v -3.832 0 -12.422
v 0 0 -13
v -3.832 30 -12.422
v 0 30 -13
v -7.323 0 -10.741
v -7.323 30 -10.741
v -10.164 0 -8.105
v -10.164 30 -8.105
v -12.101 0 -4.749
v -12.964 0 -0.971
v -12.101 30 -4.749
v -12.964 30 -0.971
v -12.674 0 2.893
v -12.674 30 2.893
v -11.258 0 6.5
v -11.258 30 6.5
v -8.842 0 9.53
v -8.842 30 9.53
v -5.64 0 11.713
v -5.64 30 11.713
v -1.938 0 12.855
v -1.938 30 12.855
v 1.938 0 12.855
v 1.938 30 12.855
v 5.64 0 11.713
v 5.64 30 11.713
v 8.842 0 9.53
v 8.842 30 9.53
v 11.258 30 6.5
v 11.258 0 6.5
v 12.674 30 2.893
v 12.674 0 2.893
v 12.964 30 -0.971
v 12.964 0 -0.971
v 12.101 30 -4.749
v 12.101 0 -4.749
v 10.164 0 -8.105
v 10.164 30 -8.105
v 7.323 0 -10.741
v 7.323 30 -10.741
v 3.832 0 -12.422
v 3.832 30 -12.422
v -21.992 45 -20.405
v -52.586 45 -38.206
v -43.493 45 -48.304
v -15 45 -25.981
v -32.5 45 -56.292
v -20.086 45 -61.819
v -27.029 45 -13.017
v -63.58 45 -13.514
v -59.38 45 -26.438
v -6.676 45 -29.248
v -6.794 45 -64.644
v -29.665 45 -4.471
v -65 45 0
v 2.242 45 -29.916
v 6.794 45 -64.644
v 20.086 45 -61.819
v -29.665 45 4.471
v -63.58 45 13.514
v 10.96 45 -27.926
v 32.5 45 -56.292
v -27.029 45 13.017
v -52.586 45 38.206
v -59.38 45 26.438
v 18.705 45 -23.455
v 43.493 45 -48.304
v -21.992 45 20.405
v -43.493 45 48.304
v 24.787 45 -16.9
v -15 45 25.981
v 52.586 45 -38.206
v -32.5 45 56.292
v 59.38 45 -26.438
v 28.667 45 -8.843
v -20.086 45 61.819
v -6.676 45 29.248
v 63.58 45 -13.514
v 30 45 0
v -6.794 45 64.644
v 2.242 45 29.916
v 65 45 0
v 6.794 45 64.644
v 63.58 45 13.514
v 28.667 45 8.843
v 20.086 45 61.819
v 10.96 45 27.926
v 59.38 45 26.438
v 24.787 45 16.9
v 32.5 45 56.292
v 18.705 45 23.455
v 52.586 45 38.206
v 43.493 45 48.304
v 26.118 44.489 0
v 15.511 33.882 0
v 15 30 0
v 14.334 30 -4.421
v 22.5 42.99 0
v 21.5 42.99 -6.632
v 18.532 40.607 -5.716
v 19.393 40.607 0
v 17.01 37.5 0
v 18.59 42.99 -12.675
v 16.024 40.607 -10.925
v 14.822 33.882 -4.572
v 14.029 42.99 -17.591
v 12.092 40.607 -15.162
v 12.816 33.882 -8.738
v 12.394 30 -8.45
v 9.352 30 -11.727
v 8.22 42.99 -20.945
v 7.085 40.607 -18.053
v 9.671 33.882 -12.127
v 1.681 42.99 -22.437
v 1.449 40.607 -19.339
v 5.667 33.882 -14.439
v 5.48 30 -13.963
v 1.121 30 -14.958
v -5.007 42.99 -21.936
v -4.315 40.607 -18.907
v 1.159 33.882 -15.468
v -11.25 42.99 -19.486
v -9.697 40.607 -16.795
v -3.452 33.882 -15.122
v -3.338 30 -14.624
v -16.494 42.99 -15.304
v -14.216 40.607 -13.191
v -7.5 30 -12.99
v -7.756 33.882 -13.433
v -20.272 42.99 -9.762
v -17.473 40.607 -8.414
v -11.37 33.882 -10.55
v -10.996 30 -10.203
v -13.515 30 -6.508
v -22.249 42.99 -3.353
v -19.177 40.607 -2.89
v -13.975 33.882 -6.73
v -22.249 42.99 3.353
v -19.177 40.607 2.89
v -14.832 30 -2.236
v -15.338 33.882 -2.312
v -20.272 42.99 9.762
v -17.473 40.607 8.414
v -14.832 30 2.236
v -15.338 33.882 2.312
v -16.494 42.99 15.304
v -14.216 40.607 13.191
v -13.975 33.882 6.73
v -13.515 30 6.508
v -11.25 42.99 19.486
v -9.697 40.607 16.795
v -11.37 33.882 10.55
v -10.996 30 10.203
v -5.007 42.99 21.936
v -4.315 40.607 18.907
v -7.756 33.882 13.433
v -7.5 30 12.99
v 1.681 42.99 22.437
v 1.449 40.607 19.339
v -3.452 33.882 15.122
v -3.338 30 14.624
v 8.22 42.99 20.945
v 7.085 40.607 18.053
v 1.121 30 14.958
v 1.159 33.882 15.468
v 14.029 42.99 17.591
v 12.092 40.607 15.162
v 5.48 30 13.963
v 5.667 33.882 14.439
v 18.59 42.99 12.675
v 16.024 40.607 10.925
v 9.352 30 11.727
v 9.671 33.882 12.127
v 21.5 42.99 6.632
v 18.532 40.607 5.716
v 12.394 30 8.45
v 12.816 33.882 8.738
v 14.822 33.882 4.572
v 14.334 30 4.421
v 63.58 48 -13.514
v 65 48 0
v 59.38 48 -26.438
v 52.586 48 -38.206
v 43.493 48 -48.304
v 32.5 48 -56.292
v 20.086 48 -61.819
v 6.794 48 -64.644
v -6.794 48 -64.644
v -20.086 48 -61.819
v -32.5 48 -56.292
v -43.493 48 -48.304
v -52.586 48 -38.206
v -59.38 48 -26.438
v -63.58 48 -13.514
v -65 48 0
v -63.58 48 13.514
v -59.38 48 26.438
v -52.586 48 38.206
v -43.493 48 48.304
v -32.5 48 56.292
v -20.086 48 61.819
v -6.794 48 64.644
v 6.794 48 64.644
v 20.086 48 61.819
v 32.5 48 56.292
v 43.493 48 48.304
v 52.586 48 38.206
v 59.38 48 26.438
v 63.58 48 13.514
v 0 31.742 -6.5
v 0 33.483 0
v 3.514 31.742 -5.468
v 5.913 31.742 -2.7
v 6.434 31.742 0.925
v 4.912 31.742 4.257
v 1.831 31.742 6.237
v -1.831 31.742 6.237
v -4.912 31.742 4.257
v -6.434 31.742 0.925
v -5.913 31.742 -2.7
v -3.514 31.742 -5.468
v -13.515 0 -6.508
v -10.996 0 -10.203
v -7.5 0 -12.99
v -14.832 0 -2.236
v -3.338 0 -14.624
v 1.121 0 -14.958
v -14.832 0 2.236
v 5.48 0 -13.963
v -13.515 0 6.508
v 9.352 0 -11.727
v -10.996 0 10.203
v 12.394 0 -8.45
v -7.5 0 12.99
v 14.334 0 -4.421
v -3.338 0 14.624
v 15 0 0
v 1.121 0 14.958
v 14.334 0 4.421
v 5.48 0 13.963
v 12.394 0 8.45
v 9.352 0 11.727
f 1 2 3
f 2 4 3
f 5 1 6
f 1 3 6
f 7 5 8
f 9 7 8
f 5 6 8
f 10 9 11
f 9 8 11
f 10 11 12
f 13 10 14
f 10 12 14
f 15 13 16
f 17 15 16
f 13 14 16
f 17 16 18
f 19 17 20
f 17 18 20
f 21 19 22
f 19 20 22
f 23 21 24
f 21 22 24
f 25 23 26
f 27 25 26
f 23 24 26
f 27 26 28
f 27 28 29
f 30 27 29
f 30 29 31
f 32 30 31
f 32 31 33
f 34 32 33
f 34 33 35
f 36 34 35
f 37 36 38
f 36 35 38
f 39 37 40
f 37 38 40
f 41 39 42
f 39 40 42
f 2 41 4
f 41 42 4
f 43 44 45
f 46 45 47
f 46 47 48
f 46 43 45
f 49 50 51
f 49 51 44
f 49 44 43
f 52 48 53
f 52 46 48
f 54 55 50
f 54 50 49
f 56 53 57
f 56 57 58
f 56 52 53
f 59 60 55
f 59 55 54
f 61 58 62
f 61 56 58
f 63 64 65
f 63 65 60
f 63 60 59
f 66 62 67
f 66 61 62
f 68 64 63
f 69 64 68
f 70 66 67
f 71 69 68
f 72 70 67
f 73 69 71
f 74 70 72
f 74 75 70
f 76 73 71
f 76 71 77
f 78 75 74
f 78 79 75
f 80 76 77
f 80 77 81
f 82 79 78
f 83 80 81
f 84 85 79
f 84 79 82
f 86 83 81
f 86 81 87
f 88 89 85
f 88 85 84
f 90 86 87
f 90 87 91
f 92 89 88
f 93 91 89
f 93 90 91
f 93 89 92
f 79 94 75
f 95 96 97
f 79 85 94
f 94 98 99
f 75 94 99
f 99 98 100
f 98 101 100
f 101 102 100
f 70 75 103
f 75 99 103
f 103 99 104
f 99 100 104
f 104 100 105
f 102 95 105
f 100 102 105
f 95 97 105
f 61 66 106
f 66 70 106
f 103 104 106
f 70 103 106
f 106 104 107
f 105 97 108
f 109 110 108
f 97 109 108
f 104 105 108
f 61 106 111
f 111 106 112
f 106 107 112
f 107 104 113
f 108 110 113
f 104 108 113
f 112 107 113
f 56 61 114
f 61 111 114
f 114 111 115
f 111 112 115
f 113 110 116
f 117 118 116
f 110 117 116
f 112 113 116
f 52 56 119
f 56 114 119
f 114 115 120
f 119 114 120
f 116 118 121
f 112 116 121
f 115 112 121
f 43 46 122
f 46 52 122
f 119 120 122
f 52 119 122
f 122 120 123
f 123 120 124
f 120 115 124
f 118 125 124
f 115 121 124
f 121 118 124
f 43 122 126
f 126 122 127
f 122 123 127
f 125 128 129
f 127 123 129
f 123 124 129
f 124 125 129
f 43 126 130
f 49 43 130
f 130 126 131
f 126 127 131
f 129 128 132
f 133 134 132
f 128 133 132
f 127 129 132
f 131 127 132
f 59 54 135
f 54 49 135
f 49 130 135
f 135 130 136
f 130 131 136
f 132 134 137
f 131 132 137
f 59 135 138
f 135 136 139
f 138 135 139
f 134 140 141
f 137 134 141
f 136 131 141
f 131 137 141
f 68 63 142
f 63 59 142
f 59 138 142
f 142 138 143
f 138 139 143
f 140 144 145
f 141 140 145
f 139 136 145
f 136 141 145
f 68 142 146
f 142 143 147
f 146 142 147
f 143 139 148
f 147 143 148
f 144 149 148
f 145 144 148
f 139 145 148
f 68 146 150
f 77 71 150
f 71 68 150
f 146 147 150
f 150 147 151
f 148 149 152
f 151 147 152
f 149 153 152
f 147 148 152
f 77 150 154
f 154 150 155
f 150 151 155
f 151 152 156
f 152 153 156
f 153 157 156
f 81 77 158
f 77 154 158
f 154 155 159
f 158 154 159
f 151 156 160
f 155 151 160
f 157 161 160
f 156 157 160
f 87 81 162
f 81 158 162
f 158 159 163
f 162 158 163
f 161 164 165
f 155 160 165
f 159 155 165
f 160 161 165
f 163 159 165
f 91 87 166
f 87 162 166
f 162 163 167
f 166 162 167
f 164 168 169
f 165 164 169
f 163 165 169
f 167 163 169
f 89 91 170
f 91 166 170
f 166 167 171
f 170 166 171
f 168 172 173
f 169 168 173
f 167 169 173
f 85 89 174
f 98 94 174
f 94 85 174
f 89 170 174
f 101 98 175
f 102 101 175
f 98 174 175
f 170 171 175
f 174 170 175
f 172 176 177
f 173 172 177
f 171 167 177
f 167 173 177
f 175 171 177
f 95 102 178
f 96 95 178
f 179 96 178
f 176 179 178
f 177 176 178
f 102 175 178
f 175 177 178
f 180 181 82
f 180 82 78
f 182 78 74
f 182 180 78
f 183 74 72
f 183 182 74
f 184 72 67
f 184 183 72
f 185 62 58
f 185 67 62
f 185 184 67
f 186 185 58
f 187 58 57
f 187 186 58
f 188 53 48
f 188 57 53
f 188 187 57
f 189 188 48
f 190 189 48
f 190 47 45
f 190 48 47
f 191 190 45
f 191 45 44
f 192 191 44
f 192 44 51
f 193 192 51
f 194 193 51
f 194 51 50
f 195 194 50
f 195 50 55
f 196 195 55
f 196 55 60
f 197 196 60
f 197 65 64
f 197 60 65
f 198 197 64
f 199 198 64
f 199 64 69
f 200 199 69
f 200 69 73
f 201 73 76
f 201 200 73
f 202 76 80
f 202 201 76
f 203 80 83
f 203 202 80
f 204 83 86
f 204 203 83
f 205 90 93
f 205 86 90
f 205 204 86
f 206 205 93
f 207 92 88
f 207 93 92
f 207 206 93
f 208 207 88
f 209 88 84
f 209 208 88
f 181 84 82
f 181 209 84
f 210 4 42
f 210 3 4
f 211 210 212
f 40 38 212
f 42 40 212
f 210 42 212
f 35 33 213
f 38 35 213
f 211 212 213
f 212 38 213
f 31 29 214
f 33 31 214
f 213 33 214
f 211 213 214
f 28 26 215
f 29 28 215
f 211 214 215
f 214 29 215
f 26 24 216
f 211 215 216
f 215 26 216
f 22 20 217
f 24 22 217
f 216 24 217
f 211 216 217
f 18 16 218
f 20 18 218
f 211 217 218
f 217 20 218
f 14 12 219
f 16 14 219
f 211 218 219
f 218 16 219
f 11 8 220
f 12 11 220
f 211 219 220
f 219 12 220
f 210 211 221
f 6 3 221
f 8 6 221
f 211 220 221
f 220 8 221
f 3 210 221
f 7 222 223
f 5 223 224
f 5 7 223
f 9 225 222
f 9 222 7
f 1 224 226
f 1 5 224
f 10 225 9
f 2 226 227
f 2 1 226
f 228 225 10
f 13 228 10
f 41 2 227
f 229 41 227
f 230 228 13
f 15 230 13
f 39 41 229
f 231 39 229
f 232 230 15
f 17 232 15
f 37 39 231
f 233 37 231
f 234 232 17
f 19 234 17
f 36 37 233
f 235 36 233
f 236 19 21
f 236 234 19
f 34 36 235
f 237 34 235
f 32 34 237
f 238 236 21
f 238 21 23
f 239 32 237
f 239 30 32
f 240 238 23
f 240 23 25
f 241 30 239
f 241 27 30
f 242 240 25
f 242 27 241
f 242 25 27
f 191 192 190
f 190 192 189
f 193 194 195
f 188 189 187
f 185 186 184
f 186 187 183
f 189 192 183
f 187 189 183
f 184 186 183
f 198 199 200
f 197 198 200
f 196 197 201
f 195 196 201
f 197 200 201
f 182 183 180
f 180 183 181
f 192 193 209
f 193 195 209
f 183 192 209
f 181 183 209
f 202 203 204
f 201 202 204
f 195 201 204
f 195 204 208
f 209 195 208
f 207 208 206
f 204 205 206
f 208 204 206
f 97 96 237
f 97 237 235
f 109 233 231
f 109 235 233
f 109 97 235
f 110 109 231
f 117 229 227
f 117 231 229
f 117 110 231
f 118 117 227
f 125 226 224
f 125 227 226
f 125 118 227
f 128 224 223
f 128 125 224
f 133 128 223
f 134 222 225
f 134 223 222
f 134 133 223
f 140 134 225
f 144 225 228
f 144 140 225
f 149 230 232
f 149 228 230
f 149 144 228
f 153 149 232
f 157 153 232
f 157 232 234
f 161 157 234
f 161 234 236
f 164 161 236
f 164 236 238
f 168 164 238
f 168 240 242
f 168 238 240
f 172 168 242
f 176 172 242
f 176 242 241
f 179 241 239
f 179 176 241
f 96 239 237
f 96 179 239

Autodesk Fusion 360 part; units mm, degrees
sketch "Sketch1" plane through (0, 0, 0) normal (0, 0, 1) x (1, 0, 0)
  line L0 (0, 48) -> (0, 0)
  line L1 (0, 0) -> (15, 0)
  line L2 (15, 0) -> (15, 30)
  line L3 (30, 45) -> (65, 45)
  line L4 (65, 45) -> (65, 48)
  line L5 (65, 48) -> (0, 48)
  arc A0 (30, 45) -> (15, 30) centre (30, 30) ccw
  arc A1 (30, 45) -> (15, 30) centre (30, 30) ccw
  dimension "d1" = 15
  dimension "d2" = 15
  dimension "d3" = 65
  dimension "d4" = 3
  dimension "d6" = 30
revolve "Revolve1" add sketch "Sketch1" angle 360 about axis through (0, 48, 0) along (0, -1, 0)
hole "Hole1" at (0, 0, 0) direction (0, 1, 0) diameter 26 depth 30 tip angle 150
